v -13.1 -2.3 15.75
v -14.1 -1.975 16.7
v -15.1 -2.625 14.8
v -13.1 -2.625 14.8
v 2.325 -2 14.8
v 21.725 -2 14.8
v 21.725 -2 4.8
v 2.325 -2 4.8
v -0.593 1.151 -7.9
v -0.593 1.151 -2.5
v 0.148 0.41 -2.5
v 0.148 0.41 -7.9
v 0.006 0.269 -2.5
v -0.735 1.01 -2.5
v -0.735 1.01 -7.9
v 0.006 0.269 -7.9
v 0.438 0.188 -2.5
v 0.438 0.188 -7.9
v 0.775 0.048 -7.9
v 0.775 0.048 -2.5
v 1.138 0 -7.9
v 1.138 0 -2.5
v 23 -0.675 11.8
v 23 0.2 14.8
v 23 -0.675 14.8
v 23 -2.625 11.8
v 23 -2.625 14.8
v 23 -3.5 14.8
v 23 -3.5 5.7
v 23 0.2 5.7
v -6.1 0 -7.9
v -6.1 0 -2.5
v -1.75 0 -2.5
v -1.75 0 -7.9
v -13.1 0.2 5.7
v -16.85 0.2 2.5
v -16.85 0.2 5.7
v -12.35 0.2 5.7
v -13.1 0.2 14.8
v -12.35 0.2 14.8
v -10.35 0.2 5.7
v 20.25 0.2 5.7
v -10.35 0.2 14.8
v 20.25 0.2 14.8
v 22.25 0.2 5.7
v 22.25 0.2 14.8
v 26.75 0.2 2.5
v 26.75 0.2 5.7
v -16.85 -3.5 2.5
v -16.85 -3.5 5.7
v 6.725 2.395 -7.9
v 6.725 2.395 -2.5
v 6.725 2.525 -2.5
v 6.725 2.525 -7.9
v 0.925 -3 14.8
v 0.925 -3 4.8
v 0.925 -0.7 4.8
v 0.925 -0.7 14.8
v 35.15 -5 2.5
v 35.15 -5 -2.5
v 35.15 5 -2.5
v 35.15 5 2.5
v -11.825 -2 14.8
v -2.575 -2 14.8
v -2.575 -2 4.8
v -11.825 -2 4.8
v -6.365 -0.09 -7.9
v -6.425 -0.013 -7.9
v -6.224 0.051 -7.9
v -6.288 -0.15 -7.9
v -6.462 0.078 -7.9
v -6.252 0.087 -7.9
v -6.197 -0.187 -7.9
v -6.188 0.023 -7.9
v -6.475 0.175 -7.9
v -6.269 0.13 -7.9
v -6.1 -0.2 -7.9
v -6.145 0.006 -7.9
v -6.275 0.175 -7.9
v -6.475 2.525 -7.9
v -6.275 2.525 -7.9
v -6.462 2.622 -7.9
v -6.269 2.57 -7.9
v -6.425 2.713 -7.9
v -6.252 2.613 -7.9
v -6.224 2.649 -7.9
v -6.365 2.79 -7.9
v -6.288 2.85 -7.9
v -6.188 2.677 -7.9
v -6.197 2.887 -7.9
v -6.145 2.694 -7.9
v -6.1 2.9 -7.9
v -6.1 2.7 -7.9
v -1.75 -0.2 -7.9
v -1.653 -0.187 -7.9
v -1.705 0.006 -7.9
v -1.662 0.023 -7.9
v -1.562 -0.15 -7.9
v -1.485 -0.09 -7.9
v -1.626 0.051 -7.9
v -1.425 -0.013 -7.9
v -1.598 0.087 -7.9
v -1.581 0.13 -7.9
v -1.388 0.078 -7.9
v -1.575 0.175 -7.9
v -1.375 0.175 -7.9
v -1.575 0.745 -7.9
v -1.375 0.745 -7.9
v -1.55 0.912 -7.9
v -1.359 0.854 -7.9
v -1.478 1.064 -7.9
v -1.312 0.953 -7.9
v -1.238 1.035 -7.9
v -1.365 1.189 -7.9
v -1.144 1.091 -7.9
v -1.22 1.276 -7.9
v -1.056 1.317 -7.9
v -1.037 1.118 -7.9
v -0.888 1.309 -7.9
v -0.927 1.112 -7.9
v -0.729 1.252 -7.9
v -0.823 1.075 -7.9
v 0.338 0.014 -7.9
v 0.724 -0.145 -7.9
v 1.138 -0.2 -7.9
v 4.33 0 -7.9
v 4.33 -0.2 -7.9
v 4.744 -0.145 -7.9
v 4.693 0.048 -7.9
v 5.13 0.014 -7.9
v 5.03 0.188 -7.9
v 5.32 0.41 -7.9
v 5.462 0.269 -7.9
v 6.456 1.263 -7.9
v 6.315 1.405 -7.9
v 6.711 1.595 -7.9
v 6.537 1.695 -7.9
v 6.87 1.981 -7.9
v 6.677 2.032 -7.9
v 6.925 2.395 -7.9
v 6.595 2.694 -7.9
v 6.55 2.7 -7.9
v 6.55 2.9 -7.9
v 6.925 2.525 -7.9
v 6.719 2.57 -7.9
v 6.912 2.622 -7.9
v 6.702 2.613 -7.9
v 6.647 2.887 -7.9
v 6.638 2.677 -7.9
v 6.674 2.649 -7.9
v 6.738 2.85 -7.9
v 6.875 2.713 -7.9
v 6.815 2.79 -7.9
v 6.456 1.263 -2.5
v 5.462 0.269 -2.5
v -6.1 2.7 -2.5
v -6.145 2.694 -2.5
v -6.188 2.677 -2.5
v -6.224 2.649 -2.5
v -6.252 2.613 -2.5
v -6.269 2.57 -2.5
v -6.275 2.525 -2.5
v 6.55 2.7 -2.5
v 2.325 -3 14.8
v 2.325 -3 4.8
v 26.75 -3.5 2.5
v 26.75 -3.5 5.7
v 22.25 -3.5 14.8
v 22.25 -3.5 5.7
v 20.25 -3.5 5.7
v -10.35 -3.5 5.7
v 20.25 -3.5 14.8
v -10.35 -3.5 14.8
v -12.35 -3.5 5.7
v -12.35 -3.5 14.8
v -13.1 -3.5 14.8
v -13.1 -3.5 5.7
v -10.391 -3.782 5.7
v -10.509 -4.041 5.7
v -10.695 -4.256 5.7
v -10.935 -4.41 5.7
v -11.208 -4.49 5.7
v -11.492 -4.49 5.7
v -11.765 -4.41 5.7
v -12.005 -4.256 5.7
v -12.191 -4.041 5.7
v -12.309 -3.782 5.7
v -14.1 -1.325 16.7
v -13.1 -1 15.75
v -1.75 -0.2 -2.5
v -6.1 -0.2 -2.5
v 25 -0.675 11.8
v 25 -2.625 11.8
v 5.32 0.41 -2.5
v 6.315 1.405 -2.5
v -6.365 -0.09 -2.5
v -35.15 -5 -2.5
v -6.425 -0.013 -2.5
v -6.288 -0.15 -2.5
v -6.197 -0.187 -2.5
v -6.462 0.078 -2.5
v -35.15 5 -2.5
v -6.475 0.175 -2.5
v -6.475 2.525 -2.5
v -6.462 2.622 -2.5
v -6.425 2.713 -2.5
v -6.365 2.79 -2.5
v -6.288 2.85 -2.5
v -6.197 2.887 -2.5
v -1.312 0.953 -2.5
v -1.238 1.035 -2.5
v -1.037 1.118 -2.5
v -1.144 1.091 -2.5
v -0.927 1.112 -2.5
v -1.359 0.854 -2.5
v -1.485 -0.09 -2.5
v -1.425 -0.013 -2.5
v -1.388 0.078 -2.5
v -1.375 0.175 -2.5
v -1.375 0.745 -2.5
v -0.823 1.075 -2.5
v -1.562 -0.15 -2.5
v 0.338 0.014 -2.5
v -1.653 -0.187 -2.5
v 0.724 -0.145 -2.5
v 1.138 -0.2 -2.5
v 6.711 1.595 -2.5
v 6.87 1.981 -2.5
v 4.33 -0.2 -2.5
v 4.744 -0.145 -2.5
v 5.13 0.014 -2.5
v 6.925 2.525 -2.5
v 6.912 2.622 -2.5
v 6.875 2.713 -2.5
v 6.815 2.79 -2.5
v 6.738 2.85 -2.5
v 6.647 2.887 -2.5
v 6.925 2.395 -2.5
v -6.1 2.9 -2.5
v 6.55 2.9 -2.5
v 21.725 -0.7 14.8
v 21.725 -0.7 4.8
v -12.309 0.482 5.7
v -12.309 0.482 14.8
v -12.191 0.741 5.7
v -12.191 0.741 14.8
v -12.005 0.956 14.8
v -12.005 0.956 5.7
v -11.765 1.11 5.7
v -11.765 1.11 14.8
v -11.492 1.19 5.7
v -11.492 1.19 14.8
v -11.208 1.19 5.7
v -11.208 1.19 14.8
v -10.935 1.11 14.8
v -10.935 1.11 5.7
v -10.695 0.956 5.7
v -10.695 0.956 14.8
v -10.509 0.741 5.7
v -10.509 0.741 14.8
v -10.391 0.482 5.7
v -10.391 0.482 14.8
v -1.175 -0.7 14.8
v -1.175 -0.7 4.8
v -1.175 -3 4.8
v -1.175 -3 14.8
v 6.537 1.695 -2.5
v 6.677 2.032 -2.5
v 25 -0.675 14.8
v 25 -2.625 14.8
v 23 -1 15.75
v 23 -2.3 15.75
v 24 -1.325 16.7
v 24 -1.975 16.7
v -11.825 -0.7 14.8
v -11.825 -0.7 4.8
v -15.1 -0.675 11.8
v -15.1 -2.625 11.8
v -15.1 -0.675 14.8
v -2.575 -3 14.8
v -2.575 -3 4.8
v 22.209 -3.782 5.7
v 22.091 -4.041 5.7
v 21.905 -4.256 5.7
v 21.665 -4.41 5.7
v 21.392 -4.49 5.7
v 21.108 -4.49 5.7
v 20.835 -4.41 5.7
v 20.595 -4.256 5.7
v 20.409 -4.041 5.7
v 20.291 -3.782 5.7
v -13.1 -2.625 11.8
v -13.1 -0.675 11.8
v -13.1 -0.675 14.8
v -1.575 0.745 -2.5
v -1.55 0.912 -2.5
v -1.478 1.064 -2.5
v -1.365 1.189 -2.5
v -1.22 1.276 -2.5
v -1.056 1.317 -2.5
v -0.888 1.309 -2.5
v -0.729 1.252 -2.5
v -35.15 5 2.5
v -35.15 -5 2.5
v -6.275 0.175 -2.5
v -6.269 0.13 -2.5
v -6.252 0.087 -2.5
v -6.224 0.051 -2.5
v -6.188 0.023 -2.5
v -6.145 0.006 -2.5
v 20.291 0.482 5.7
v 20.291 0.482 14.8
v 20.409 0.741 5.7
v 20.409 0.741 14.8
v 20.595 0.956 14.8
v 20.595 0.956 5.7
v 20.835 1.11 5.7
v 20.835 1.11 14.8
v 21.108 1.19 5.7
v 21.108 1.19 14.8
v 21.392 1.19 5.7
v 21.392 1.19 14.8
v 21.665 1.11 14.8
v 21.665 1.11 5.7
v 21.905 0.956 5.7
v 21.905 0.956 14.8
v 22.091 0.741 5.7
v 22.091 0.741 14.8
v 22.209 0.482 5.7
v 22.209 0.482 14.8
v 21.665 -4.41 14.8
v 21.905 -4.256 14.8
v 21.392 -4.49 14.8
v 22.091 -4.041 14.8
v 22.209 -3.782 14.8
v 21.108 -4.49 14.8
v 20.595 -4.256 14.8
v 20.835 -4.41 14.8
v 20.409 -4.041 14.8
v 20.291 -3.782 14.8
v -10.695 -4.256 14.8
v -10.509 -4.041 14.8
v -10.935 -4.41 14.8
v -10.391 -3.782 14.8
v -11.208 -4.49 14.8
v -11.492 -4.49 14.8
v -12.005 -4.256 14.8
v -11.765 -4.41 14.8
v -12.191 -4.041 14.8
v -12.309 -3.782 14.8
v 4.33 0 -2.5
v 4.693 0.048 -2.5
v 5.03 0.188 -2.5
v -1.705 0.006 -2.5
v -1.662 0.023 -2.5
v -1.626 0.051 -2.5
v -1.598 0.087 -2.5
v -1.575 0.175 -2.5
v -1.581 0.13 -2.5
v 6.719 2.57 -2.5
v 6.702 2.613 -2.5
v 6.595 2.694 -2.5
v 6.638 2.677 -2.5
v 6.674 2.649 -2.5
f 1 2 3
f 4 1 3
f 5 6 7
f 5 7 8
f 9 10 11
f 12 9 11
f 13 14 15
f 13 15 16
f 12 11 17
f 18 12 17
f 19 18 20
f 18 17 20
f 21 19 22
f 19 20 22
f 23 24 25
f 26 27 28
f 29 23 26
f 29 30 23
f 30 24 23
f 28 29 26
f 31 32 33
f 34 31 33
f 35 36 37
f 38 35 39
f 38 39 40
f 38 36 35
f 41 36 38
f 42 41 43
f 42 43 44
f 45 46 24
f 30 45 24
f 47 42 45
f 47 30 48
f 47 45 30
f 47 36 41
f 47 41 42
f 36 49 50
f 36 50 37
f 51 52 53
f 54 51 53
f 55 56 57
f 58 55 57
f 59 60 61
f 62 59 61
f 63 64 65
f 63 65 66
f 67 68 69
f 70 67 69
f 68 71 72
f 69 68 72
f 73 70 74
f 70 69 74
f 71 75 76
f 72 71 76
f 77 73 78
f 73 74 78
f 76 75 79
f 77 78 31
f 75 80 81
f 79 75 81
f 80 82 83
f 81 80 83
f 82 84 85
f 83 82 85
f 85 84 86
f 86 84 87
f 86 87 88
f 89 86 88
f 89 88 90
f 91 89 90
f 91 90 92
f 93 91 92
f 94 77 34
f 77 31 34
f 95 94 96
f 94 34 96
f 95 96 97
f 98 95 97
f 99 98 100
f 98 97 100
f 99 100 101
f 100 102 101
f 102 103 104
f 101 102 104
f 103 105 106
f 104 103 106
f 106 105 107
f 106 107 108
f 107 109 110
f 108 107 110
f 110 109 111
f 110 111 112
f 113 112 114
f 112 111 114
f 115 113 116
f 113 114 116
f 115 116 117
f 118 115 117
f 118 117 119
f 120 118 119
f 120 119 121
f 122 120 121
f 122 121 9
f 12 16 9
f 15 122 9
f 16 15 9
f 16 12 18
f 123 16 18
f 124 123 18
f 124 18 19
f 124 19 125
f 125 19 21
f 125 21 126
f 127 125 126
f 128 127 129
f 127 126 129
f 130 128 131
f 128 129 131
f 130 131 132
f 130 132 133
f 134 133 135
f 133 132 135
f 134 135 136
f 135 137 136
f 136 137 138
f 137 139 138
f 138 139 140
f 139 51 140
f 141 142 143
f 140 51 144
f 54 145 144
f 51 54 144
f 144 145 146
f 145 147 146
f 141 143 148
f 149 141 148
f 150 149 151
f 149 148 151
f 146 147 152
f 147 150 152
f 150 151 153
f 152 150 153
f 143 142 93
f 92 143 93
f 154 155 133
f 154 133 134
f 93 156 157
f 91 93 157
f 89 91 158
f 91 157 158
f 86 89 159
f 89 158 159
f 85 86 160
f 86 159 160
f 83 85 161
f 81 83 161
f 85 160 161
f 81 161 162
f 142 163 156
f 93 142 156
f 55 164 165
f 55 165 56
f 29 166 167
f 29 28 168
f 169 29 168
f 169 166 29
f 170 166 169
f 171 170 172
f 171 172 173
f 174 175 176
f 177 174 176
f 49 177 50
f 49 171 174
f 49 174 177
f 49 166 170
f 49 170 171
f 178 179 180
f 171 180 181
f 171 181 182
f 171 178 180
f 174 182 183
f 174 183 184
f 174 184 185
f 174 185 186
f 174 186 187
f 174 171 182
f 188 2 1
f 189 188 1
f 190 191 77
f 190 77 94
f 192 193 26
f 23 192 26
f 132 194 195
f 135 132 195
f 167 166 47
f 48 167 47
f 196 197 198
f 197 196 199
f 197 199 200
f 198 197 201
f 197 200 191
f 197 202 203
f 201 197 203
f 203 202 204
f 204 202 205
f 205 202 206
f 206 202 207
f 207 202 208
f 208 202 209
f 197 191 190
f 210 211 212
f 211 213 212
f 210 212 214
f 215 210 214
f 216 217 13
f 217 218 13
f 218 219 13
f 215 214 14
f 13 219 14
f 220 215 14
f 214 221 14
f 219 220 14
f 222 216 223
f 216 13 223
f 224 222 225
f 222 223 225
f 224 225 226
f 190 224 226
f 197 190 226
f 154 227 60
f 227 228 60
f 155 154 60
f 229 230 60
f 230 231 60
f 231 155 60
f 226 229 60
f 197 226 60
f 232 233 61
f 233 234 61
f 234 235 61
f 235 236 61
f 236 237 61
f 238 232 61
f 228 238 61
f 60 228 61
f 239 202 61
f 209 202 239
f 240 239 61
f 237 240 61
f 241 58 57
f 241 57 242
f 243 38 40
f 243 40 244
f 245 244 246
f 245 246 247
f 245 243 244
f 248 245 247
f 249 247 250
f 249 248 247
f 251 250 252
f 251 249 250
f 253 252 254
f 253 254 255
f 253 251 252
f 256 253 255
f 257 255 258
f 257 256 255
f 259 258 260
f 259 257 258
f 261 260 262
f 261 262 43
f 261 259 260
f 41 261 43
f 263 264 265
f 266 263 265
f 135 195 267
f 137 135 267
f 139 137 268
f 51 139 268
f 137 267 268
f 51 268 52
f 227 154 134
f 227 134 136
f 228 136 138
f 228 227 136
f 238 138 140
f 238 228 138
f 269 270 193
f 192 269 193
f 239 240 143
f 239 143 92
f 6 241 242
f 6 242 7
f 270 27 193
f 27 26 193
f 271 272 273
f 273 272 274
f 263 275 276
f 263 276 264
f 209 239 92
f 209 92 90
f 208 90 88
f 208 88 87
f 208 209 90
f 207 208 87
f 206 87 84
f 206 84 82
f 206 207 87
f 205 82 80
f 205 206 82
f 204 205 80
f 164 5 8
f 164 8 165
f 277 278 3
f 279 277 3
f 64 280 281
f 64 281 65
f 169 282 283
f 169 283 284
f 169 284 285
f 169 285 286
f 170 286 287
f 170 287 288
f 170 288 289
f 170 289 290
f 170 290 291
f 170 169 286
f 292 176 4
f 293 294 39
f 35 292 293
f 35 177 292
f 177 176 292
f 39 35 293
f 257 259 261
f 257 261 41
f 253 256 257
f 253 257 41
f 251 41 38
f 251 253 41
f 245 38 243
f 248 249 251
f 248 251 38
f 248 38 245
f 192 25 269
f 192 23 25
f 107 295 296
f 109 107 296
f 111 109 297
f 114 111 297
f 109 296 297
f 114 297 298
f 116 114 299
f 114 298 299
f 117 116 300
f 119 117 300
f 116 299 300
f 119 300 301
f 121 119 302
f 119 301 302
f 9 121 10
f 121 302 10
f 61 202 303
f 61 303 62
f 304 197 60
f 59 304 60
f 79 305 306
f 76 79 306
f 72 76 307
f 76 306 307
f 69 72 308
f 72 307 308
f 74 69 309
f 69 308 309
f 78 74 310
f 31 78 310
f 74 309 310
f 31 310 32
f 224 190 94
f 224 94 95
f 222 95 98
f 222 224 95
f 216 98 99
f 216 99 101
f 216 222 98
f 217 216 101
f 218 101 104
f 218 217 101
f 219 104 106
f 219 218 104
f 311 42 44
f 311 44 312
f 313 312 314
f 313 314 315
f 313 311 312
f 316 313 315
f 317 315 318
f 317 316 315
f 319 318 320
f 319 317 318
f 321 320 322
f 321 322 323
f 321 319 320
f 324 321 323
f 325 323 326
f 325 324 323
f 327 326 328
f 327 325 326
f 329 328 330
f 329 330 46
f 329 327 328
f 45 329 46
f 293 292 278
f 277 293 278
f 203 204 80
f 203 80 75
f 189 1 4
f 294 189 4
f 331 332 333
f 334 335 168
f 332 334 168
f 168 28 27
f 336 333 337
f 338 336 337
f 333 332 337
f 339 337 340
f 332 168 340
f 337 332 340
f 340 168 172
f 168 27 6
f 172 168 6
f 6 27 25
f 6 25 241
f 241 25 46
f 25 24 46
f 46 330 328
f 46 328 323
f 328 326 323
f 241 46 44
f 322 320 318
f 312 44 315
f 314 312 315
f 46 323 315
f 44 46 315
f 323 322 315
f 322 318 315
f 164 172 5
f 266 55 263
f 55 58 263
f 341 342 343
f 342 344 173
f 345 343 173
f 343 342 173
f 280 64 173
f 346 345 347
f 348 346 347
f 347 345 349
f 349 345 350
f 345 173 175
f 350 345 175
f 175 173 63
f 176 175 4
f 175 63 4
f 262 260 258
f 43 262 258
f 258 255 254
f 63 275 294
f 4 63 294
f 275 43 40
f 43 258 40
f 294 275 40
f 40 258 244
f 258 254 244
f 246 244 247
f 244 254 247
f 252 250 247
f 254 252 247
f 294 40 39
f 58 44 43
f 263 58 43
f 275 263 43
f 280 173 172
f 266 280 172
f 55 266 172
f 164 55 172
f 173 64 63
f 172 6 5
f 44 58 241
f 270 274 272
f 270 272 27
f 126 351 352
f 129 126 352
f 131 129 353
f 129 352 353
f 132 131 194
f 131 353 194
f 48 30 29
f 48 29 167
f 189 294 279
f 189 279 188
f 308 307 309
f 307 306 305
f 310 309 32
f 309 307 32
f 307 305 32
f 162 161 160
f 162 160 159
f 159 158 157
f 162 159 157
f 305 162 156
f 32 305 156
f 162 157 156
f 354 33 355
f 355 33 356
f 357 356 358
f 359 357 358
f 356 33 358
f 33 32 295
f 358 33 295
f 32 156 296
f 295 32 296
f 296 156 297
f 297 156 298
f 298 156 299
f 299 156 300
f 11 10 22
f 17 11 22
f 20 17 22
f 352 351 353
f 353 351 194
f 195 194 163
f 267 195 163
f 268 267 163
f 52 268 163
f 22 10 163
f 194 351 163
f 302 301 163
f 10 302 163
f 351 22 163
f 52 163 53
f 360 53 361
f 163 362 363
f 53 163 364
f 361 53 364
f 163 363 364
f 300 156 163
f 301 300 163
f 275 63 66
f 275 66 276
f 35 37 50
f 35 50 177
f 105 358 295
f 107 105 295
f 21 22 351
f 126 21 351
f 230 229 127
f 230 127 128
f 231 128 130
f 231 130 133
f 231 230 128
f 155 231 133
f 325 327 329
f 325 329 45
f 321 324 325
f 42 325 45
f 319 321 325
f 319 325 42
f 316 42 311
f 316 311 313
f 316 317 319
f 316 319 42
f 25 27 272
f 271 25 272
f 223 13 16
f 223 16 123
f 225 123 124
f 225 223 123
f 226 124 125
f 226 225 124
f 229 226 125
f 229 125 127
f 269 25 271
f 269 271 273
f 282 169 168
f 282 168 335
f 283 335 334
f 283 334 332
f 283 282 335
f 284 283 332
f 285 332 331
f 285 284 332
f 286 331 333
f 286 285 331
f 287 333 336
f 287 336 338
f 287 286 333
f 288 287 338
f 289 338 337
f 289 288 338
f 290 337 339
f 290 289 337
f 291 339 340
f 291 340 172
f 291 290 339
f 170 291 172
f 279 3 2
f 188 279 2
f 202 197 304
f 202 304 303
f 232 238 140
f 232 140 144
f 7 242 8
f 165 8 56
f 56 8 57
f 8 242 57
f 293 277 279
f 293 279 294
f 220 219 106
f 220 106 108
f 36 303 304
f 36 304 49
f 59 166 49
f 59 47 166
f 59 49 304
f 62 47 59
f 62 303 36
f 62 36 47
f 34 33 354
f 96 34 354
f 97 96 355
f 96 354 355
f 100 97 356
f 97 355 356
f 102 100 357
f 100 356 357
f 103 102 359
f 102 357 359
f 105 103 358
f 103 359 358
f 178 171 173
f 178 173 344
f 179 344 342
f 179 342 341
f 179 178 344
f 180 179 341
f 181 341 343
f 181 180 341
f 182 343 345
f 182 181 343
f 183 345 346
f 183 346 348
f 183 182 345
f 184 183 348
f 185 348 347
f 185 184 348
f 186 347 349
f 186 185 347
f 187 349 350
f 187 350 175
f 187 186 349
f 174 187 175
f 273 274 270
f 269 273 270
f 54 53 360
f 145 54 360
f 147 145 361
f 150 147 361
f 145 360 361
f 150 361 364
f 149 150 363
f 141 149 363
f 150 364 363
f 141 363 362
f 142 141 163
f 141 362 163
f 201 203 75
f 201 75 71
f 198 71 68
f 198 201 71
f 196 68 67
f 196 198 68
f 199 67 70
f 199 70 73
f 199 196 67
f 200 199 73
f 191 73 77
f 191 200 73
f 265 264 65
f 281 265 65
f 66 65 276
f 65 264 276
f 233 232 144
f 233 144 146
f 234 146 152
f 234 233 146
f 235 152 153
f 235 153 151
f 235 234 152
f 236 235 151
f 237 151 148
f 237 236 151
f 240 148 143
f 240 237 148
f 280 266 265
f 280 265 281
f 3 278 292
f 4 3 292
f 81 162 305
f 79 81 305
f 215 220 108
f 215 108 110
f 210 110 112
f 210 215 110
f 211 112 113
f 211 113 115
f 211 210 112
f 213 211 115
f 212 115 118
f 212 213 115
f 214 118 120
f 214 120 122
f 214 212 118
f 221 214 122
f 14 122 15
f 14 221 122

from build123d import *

# Parameters (mm, degrees)
BOSS_EXTRUDE1_DEPTH      = 2.5
BOSS_EXTRUDE1_DEPTH_BACK = 2.5
SKETCH1_W                = 70.3
SKETCH1_H                = 10
SKETCH2_W                = 43.6
SKETCH2_H                = 3.7
BOSS_EXTRUDE2_DEPTH      = 3.2
BOSS_EXTRUDE3_DEPTH      = 9.1
CUT_EXTRUDE1_DEPTH       = 10
BOSS_EXTRUDE4_DEPTH      = 0.975
BOSS_EXTRUDE4_DEPTH_BACK = 0.975
CUT_EXTRUDE2_DEPTH       = 34
CUT_EXTRUDE2_DEPTH_BACK  = 18.975
BOSS_EXTRUDE5_DEPTH      = 5.4


with BuildPart() as part:
    # Sketch1 → Boss-Extrude1 (new, two sides: drawn at the far end of the back side and taken through both)
    with BuildSketch(Plane.XY.offset(-BOSS_EXTRUDE1_DEPTH_BACK)):
        Rectangle(SKETCH1_W, SKETCH1_H)
    extrude(amount=BOSS_EXTRUDE1_DEPTH + BOSS_EXTRUDE1_DEPTH_BACK)

    # Sketch2 → Boss-Extrude2 (add)
    with BuildSketch(Plane.XY.offset(2.5)):
        with Locations((4.95, -1.65)):
            Rectangle(SKETCH2_W, SKETCH2_H)
    extrude(amount=BOSS_EXTRUDE2_DEPTH)

    # Sketch3 → Boss-Extrude3 (add)
    with BuildSketch(Plane.XY.offset(5.7)):
        with BuildLine():
            Line((-13.1, 0.2), (-12.35, 0.2))
            ThreePointArc((-12.35, 0.2), (-11.35, 1.2), (-10.35, 0.2))
            Line((-10.35, 0.2), (20.25, 0.2))
            ThreePointArc((20.25, 0.2), (21.25, 1.2), (22.25, 0.2))
            Line((22.25, 0.2), (23, 0.2))
            Line((23, 0.2), (23, -3.5))
            Line((23, -3.5), (22.25, -3.5))
            ThreePointArc((22.25, -3.5), (21.25, -4.5), (20.25, -3.5))
            Line((20.25, -3.5), (-10.35, -3.5))
            ThreePointArc((-10.35, -3.5), (-11.35, -4.5), (-12.35, -3.5))
            Line((-12.35, -3.5), (-13.1, -3.5))
            Line((-13.1, -3.5), (-13.1, 0.2))
        make_face()
    extrude(amount=BOSS_EXTRUDE3_DEPTH)

    # Sketch4 → Cut-Extrude1 (cut)
    with BuildSketch(Plane.XY.offset(14.8)):
        Polygon((-11.825, -0.7), (-1.175, -0.7), (-1.175, -3), (-2.575, -3), (-2.575, -2), (-11.825, -2), align=None)
        Polygon((0.925, -0.7), (21.725, -0.7), (21.725, -2), (2.325, -2), (2.325, -3), (0.925, -3), align=None)
    extrude(amount=-CUT_EXTRUDE1_DEPTH, mode=Mode.SUBTRACT)

    # Sketch5 → Boss-Extrude4 (add, two sides: drawn at the far end of the back side and taken through both)
    with BuildSketch(Plane(origin=(0, -1.65, 0), x_dir=(1, 0, 0), z_dir=(0, 1, 0)).offset(-BOSS_EXTRUDE4_DEPTH_BACK)):
        Polygon((-13.1, -11.8), (-15.1, -11.8), (-15.1, -14.8), (-14.1, -16.7), (-13.1, -15.75), align=None)
        Polygon((24, -16.7), (25, -14.8), (25, -11.8), (23, -11.8), (23, -15.75), align=None)
    extrude(amount=BOSS_EXTRUDE4_DEPTH + BOSS_EXTRUDE4_DEPTH_BACK)

    # Sketch6 → Cut-Extrude2 (cut, two sides: drawn at the far end of the back side and taken through both)
    with BuildSketch(Plane(origin=(0, 0, 0), x_dir=(0, 0, -1), z_dir=(1, 0, 0)).offset(-CUT_EXTRUDE2_DEPTH_BACK)):
        Polygon((-14.8, -2.625), (-16.7, -1.975), (-16.7, -2.625), align=None)
        Polygon((-16.7, -1.325), (-14.8, -0.675), (-16.7, -0.675), align=None)
    extrude(amount=CUT_EXTRUDE2_DEPTH + CUT_EXTRUDE2_DEPTH_BACK, mode=Mode.SUBTRACT)

    # Sketch7 → Boss-Extrude5 (add)
    with BuildSketch(Plane(origin=(0, 0, -2.5), x_dir=(-1, 0, 0), z_dir=(0, 0, -1))):
        with BuildLine():
            Line((-6.55, 2.9), (6.1, 2.9))
            ThreePointArc((6.1, 2.9), (6.365165043, 2.790165043), (6.475, 2.525))
            Line((6.475, 2.525), (6.475, 0.175))
            ThreePointArc((6.475, 0.175), (6.365165043, -0.090165043), (6.1, -0.2))
            Line((6.1, -0.2), (1.75, -0.2))
            ThreePointArc((1.75, -0.2), (1.484834957, -0.090165043), (1.375, 0.175))
            Line((1.375, 0.175), (1.375, 0.744669914))
            ThreePointArc((1.375, 0.744669914), (1.143506287, 1.091124739), (0.734834957, 1.009834957))
            Line((0.734834957, 1.009834957), (-0.00637085, 0.26862915))
            ThreePointArc((-0.00637085, 0.26862915), (-0.525448208, -0.078207252), (-1.1377417, -0.2))
            Line((-1.1377417, -0.2), (-4.330354687, -0.2))
            ThreePointArc((-4.330354687, -0.2), (-4.942648179, -0.078207252), (-5.461725537, 0.26862915))
            Line((-5.461725537, 0.26862915), (-6.45637085, 1.263274463))
            ThreePointArc((-6.45637085, 1.263274463), (-6.803207252, 1.782351821), (-6.925, 2.394645313))
            Line((-6.925, 2.394645313), (-6.925, 2.525))
            ThreePointArc((-6.925, 2.525), (-6.815165043, 2.790165043), (-6.55, 2.9))
        make_face()
        with BuildLine():
            Line((-5.320304181, 0.410050506), (-6.314949494, 1.404695819))
            ThreePointArc((-6.314949494, 1.404695819), (-6.618431346, 1.858888508), (-6.725, 2.394645313))
            Line((-6.725, 2.394645313), (-6.725, 2.525))
            ThreePointArc((-6.725, 2.525), (-6.673743687, 2.648743687), (-6.55, 2.7))
            Line((-6.55, 2.7), (6.1, 2.7))
            ThreePointArc((6.1, 2.7), (6.223743687, 2.648743687), (6.275, 2.525))
            Line((6.275, 2.525), (6.275, 0.175))
            ThreePointArc((6.275, 0.175), (6.223743687, 0.051256313), (6.1, 0))
            Line((6.1, 0), (1.75, 0))
            ThreePointArc((1.75, 0), (1.626256313, 0.051256313), (1.575, 0.175))
            Line((1.575, 0.175), (1.575, 0.744669914))
            ThreePointArc((1.575, 0.744669914), (1.220042974, 1.275900645), (0.593413601, 1.151256313))
            Line((0.593413601, 1.151256313), (-0.147792206, 0.410050506))
            ThreePointArc((-0.147792206, 0.410050506), (-0.601984894, 0.106568654), (-1.1377417, 0))
            Line((-1.1377417, 0), (-4.330354687, 0))
            ThreePointArc((-4.330354687, 0), (-4.866111492, 0.106568654), (-5.320304181, 0.410050506))
        make_face(mode=Mode.SUBTRACT)
    extrude(amount=BOSS_EXTRUDE5_DEPTH)


solid = part.part
